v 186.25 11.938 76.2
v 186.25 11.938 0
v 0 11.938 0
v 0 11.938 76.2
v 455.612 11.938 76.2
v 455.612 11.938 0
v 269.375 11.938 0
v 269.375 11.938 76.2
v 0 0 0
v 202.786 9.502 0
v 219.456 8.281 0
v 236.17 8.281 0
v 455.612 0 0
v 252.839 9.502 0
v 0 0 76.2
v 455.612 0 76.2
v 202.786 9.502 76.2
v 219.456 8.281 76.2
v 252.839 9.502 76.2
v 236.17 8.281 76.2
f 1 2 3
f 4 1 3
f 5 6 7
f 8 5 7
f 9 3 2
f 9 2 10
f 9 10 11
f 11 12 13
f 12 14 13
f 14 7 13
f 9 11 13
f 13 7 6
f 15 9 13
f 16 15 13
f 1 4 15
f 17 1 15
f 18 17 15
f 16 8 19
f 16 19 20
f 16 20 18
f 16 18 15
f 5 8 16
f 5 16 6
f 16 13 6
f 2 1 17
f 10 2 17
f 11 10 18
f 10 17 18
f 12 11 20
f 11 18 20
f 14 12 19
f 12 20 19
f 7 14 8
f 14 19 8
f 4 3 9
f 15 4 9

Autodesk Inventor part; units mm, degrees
ref_plane "YZ Plane" through (0, 0, 0) normal (1, 0, 0) x (0, 1, 0)
ref_plane "XZ Plane" through (0, 0, 0) normal (0, 1, 0) x (-1, 0, 0)
ref_plane "XY Plane" through (0, 0, 0) normal (0, 0, 1) x (1, 0, 0)
sketch "Sketch1" plane through (0, 0, 0) normal (0, 0, 1) x (1, 0, 0)
  line L0 (0, 0) -> (455.6125, 0)
  line L1 (455.6125, 0) -> (455.6125, 11.938)
  line L2 (455.6125, 11.938) -> (0, 11.938)
  line L3 (0, 11.938) -> (0, 0)
  dimension "d0" = 455.6125
  dimension "d1" = 11.938
extrude "Extrusion1" add sketch "Sketch1" along normal blind 76.2
sketch "Sketch2" plane through (0, 0, 76.2) normal (0, 0, 1) x (1, 0, 0)
  circle A0 centre (227.8126, 236.728) radius 228.6
  line L0 (455.6125, 11.938) -> (0, 11.938) projected
  line L1 (0, 11.938) -> (0, 0) projected
  dimension "d6" = 227.8126
  dimension "d7" = 224.79
  dimension "d8" = 457.2
extrude "Extrusion2" cut sketch "Sketch2" against normal through all
properties part number "Exhaust Frame Upper+Lower as-built" material "Wood (Oak)"
